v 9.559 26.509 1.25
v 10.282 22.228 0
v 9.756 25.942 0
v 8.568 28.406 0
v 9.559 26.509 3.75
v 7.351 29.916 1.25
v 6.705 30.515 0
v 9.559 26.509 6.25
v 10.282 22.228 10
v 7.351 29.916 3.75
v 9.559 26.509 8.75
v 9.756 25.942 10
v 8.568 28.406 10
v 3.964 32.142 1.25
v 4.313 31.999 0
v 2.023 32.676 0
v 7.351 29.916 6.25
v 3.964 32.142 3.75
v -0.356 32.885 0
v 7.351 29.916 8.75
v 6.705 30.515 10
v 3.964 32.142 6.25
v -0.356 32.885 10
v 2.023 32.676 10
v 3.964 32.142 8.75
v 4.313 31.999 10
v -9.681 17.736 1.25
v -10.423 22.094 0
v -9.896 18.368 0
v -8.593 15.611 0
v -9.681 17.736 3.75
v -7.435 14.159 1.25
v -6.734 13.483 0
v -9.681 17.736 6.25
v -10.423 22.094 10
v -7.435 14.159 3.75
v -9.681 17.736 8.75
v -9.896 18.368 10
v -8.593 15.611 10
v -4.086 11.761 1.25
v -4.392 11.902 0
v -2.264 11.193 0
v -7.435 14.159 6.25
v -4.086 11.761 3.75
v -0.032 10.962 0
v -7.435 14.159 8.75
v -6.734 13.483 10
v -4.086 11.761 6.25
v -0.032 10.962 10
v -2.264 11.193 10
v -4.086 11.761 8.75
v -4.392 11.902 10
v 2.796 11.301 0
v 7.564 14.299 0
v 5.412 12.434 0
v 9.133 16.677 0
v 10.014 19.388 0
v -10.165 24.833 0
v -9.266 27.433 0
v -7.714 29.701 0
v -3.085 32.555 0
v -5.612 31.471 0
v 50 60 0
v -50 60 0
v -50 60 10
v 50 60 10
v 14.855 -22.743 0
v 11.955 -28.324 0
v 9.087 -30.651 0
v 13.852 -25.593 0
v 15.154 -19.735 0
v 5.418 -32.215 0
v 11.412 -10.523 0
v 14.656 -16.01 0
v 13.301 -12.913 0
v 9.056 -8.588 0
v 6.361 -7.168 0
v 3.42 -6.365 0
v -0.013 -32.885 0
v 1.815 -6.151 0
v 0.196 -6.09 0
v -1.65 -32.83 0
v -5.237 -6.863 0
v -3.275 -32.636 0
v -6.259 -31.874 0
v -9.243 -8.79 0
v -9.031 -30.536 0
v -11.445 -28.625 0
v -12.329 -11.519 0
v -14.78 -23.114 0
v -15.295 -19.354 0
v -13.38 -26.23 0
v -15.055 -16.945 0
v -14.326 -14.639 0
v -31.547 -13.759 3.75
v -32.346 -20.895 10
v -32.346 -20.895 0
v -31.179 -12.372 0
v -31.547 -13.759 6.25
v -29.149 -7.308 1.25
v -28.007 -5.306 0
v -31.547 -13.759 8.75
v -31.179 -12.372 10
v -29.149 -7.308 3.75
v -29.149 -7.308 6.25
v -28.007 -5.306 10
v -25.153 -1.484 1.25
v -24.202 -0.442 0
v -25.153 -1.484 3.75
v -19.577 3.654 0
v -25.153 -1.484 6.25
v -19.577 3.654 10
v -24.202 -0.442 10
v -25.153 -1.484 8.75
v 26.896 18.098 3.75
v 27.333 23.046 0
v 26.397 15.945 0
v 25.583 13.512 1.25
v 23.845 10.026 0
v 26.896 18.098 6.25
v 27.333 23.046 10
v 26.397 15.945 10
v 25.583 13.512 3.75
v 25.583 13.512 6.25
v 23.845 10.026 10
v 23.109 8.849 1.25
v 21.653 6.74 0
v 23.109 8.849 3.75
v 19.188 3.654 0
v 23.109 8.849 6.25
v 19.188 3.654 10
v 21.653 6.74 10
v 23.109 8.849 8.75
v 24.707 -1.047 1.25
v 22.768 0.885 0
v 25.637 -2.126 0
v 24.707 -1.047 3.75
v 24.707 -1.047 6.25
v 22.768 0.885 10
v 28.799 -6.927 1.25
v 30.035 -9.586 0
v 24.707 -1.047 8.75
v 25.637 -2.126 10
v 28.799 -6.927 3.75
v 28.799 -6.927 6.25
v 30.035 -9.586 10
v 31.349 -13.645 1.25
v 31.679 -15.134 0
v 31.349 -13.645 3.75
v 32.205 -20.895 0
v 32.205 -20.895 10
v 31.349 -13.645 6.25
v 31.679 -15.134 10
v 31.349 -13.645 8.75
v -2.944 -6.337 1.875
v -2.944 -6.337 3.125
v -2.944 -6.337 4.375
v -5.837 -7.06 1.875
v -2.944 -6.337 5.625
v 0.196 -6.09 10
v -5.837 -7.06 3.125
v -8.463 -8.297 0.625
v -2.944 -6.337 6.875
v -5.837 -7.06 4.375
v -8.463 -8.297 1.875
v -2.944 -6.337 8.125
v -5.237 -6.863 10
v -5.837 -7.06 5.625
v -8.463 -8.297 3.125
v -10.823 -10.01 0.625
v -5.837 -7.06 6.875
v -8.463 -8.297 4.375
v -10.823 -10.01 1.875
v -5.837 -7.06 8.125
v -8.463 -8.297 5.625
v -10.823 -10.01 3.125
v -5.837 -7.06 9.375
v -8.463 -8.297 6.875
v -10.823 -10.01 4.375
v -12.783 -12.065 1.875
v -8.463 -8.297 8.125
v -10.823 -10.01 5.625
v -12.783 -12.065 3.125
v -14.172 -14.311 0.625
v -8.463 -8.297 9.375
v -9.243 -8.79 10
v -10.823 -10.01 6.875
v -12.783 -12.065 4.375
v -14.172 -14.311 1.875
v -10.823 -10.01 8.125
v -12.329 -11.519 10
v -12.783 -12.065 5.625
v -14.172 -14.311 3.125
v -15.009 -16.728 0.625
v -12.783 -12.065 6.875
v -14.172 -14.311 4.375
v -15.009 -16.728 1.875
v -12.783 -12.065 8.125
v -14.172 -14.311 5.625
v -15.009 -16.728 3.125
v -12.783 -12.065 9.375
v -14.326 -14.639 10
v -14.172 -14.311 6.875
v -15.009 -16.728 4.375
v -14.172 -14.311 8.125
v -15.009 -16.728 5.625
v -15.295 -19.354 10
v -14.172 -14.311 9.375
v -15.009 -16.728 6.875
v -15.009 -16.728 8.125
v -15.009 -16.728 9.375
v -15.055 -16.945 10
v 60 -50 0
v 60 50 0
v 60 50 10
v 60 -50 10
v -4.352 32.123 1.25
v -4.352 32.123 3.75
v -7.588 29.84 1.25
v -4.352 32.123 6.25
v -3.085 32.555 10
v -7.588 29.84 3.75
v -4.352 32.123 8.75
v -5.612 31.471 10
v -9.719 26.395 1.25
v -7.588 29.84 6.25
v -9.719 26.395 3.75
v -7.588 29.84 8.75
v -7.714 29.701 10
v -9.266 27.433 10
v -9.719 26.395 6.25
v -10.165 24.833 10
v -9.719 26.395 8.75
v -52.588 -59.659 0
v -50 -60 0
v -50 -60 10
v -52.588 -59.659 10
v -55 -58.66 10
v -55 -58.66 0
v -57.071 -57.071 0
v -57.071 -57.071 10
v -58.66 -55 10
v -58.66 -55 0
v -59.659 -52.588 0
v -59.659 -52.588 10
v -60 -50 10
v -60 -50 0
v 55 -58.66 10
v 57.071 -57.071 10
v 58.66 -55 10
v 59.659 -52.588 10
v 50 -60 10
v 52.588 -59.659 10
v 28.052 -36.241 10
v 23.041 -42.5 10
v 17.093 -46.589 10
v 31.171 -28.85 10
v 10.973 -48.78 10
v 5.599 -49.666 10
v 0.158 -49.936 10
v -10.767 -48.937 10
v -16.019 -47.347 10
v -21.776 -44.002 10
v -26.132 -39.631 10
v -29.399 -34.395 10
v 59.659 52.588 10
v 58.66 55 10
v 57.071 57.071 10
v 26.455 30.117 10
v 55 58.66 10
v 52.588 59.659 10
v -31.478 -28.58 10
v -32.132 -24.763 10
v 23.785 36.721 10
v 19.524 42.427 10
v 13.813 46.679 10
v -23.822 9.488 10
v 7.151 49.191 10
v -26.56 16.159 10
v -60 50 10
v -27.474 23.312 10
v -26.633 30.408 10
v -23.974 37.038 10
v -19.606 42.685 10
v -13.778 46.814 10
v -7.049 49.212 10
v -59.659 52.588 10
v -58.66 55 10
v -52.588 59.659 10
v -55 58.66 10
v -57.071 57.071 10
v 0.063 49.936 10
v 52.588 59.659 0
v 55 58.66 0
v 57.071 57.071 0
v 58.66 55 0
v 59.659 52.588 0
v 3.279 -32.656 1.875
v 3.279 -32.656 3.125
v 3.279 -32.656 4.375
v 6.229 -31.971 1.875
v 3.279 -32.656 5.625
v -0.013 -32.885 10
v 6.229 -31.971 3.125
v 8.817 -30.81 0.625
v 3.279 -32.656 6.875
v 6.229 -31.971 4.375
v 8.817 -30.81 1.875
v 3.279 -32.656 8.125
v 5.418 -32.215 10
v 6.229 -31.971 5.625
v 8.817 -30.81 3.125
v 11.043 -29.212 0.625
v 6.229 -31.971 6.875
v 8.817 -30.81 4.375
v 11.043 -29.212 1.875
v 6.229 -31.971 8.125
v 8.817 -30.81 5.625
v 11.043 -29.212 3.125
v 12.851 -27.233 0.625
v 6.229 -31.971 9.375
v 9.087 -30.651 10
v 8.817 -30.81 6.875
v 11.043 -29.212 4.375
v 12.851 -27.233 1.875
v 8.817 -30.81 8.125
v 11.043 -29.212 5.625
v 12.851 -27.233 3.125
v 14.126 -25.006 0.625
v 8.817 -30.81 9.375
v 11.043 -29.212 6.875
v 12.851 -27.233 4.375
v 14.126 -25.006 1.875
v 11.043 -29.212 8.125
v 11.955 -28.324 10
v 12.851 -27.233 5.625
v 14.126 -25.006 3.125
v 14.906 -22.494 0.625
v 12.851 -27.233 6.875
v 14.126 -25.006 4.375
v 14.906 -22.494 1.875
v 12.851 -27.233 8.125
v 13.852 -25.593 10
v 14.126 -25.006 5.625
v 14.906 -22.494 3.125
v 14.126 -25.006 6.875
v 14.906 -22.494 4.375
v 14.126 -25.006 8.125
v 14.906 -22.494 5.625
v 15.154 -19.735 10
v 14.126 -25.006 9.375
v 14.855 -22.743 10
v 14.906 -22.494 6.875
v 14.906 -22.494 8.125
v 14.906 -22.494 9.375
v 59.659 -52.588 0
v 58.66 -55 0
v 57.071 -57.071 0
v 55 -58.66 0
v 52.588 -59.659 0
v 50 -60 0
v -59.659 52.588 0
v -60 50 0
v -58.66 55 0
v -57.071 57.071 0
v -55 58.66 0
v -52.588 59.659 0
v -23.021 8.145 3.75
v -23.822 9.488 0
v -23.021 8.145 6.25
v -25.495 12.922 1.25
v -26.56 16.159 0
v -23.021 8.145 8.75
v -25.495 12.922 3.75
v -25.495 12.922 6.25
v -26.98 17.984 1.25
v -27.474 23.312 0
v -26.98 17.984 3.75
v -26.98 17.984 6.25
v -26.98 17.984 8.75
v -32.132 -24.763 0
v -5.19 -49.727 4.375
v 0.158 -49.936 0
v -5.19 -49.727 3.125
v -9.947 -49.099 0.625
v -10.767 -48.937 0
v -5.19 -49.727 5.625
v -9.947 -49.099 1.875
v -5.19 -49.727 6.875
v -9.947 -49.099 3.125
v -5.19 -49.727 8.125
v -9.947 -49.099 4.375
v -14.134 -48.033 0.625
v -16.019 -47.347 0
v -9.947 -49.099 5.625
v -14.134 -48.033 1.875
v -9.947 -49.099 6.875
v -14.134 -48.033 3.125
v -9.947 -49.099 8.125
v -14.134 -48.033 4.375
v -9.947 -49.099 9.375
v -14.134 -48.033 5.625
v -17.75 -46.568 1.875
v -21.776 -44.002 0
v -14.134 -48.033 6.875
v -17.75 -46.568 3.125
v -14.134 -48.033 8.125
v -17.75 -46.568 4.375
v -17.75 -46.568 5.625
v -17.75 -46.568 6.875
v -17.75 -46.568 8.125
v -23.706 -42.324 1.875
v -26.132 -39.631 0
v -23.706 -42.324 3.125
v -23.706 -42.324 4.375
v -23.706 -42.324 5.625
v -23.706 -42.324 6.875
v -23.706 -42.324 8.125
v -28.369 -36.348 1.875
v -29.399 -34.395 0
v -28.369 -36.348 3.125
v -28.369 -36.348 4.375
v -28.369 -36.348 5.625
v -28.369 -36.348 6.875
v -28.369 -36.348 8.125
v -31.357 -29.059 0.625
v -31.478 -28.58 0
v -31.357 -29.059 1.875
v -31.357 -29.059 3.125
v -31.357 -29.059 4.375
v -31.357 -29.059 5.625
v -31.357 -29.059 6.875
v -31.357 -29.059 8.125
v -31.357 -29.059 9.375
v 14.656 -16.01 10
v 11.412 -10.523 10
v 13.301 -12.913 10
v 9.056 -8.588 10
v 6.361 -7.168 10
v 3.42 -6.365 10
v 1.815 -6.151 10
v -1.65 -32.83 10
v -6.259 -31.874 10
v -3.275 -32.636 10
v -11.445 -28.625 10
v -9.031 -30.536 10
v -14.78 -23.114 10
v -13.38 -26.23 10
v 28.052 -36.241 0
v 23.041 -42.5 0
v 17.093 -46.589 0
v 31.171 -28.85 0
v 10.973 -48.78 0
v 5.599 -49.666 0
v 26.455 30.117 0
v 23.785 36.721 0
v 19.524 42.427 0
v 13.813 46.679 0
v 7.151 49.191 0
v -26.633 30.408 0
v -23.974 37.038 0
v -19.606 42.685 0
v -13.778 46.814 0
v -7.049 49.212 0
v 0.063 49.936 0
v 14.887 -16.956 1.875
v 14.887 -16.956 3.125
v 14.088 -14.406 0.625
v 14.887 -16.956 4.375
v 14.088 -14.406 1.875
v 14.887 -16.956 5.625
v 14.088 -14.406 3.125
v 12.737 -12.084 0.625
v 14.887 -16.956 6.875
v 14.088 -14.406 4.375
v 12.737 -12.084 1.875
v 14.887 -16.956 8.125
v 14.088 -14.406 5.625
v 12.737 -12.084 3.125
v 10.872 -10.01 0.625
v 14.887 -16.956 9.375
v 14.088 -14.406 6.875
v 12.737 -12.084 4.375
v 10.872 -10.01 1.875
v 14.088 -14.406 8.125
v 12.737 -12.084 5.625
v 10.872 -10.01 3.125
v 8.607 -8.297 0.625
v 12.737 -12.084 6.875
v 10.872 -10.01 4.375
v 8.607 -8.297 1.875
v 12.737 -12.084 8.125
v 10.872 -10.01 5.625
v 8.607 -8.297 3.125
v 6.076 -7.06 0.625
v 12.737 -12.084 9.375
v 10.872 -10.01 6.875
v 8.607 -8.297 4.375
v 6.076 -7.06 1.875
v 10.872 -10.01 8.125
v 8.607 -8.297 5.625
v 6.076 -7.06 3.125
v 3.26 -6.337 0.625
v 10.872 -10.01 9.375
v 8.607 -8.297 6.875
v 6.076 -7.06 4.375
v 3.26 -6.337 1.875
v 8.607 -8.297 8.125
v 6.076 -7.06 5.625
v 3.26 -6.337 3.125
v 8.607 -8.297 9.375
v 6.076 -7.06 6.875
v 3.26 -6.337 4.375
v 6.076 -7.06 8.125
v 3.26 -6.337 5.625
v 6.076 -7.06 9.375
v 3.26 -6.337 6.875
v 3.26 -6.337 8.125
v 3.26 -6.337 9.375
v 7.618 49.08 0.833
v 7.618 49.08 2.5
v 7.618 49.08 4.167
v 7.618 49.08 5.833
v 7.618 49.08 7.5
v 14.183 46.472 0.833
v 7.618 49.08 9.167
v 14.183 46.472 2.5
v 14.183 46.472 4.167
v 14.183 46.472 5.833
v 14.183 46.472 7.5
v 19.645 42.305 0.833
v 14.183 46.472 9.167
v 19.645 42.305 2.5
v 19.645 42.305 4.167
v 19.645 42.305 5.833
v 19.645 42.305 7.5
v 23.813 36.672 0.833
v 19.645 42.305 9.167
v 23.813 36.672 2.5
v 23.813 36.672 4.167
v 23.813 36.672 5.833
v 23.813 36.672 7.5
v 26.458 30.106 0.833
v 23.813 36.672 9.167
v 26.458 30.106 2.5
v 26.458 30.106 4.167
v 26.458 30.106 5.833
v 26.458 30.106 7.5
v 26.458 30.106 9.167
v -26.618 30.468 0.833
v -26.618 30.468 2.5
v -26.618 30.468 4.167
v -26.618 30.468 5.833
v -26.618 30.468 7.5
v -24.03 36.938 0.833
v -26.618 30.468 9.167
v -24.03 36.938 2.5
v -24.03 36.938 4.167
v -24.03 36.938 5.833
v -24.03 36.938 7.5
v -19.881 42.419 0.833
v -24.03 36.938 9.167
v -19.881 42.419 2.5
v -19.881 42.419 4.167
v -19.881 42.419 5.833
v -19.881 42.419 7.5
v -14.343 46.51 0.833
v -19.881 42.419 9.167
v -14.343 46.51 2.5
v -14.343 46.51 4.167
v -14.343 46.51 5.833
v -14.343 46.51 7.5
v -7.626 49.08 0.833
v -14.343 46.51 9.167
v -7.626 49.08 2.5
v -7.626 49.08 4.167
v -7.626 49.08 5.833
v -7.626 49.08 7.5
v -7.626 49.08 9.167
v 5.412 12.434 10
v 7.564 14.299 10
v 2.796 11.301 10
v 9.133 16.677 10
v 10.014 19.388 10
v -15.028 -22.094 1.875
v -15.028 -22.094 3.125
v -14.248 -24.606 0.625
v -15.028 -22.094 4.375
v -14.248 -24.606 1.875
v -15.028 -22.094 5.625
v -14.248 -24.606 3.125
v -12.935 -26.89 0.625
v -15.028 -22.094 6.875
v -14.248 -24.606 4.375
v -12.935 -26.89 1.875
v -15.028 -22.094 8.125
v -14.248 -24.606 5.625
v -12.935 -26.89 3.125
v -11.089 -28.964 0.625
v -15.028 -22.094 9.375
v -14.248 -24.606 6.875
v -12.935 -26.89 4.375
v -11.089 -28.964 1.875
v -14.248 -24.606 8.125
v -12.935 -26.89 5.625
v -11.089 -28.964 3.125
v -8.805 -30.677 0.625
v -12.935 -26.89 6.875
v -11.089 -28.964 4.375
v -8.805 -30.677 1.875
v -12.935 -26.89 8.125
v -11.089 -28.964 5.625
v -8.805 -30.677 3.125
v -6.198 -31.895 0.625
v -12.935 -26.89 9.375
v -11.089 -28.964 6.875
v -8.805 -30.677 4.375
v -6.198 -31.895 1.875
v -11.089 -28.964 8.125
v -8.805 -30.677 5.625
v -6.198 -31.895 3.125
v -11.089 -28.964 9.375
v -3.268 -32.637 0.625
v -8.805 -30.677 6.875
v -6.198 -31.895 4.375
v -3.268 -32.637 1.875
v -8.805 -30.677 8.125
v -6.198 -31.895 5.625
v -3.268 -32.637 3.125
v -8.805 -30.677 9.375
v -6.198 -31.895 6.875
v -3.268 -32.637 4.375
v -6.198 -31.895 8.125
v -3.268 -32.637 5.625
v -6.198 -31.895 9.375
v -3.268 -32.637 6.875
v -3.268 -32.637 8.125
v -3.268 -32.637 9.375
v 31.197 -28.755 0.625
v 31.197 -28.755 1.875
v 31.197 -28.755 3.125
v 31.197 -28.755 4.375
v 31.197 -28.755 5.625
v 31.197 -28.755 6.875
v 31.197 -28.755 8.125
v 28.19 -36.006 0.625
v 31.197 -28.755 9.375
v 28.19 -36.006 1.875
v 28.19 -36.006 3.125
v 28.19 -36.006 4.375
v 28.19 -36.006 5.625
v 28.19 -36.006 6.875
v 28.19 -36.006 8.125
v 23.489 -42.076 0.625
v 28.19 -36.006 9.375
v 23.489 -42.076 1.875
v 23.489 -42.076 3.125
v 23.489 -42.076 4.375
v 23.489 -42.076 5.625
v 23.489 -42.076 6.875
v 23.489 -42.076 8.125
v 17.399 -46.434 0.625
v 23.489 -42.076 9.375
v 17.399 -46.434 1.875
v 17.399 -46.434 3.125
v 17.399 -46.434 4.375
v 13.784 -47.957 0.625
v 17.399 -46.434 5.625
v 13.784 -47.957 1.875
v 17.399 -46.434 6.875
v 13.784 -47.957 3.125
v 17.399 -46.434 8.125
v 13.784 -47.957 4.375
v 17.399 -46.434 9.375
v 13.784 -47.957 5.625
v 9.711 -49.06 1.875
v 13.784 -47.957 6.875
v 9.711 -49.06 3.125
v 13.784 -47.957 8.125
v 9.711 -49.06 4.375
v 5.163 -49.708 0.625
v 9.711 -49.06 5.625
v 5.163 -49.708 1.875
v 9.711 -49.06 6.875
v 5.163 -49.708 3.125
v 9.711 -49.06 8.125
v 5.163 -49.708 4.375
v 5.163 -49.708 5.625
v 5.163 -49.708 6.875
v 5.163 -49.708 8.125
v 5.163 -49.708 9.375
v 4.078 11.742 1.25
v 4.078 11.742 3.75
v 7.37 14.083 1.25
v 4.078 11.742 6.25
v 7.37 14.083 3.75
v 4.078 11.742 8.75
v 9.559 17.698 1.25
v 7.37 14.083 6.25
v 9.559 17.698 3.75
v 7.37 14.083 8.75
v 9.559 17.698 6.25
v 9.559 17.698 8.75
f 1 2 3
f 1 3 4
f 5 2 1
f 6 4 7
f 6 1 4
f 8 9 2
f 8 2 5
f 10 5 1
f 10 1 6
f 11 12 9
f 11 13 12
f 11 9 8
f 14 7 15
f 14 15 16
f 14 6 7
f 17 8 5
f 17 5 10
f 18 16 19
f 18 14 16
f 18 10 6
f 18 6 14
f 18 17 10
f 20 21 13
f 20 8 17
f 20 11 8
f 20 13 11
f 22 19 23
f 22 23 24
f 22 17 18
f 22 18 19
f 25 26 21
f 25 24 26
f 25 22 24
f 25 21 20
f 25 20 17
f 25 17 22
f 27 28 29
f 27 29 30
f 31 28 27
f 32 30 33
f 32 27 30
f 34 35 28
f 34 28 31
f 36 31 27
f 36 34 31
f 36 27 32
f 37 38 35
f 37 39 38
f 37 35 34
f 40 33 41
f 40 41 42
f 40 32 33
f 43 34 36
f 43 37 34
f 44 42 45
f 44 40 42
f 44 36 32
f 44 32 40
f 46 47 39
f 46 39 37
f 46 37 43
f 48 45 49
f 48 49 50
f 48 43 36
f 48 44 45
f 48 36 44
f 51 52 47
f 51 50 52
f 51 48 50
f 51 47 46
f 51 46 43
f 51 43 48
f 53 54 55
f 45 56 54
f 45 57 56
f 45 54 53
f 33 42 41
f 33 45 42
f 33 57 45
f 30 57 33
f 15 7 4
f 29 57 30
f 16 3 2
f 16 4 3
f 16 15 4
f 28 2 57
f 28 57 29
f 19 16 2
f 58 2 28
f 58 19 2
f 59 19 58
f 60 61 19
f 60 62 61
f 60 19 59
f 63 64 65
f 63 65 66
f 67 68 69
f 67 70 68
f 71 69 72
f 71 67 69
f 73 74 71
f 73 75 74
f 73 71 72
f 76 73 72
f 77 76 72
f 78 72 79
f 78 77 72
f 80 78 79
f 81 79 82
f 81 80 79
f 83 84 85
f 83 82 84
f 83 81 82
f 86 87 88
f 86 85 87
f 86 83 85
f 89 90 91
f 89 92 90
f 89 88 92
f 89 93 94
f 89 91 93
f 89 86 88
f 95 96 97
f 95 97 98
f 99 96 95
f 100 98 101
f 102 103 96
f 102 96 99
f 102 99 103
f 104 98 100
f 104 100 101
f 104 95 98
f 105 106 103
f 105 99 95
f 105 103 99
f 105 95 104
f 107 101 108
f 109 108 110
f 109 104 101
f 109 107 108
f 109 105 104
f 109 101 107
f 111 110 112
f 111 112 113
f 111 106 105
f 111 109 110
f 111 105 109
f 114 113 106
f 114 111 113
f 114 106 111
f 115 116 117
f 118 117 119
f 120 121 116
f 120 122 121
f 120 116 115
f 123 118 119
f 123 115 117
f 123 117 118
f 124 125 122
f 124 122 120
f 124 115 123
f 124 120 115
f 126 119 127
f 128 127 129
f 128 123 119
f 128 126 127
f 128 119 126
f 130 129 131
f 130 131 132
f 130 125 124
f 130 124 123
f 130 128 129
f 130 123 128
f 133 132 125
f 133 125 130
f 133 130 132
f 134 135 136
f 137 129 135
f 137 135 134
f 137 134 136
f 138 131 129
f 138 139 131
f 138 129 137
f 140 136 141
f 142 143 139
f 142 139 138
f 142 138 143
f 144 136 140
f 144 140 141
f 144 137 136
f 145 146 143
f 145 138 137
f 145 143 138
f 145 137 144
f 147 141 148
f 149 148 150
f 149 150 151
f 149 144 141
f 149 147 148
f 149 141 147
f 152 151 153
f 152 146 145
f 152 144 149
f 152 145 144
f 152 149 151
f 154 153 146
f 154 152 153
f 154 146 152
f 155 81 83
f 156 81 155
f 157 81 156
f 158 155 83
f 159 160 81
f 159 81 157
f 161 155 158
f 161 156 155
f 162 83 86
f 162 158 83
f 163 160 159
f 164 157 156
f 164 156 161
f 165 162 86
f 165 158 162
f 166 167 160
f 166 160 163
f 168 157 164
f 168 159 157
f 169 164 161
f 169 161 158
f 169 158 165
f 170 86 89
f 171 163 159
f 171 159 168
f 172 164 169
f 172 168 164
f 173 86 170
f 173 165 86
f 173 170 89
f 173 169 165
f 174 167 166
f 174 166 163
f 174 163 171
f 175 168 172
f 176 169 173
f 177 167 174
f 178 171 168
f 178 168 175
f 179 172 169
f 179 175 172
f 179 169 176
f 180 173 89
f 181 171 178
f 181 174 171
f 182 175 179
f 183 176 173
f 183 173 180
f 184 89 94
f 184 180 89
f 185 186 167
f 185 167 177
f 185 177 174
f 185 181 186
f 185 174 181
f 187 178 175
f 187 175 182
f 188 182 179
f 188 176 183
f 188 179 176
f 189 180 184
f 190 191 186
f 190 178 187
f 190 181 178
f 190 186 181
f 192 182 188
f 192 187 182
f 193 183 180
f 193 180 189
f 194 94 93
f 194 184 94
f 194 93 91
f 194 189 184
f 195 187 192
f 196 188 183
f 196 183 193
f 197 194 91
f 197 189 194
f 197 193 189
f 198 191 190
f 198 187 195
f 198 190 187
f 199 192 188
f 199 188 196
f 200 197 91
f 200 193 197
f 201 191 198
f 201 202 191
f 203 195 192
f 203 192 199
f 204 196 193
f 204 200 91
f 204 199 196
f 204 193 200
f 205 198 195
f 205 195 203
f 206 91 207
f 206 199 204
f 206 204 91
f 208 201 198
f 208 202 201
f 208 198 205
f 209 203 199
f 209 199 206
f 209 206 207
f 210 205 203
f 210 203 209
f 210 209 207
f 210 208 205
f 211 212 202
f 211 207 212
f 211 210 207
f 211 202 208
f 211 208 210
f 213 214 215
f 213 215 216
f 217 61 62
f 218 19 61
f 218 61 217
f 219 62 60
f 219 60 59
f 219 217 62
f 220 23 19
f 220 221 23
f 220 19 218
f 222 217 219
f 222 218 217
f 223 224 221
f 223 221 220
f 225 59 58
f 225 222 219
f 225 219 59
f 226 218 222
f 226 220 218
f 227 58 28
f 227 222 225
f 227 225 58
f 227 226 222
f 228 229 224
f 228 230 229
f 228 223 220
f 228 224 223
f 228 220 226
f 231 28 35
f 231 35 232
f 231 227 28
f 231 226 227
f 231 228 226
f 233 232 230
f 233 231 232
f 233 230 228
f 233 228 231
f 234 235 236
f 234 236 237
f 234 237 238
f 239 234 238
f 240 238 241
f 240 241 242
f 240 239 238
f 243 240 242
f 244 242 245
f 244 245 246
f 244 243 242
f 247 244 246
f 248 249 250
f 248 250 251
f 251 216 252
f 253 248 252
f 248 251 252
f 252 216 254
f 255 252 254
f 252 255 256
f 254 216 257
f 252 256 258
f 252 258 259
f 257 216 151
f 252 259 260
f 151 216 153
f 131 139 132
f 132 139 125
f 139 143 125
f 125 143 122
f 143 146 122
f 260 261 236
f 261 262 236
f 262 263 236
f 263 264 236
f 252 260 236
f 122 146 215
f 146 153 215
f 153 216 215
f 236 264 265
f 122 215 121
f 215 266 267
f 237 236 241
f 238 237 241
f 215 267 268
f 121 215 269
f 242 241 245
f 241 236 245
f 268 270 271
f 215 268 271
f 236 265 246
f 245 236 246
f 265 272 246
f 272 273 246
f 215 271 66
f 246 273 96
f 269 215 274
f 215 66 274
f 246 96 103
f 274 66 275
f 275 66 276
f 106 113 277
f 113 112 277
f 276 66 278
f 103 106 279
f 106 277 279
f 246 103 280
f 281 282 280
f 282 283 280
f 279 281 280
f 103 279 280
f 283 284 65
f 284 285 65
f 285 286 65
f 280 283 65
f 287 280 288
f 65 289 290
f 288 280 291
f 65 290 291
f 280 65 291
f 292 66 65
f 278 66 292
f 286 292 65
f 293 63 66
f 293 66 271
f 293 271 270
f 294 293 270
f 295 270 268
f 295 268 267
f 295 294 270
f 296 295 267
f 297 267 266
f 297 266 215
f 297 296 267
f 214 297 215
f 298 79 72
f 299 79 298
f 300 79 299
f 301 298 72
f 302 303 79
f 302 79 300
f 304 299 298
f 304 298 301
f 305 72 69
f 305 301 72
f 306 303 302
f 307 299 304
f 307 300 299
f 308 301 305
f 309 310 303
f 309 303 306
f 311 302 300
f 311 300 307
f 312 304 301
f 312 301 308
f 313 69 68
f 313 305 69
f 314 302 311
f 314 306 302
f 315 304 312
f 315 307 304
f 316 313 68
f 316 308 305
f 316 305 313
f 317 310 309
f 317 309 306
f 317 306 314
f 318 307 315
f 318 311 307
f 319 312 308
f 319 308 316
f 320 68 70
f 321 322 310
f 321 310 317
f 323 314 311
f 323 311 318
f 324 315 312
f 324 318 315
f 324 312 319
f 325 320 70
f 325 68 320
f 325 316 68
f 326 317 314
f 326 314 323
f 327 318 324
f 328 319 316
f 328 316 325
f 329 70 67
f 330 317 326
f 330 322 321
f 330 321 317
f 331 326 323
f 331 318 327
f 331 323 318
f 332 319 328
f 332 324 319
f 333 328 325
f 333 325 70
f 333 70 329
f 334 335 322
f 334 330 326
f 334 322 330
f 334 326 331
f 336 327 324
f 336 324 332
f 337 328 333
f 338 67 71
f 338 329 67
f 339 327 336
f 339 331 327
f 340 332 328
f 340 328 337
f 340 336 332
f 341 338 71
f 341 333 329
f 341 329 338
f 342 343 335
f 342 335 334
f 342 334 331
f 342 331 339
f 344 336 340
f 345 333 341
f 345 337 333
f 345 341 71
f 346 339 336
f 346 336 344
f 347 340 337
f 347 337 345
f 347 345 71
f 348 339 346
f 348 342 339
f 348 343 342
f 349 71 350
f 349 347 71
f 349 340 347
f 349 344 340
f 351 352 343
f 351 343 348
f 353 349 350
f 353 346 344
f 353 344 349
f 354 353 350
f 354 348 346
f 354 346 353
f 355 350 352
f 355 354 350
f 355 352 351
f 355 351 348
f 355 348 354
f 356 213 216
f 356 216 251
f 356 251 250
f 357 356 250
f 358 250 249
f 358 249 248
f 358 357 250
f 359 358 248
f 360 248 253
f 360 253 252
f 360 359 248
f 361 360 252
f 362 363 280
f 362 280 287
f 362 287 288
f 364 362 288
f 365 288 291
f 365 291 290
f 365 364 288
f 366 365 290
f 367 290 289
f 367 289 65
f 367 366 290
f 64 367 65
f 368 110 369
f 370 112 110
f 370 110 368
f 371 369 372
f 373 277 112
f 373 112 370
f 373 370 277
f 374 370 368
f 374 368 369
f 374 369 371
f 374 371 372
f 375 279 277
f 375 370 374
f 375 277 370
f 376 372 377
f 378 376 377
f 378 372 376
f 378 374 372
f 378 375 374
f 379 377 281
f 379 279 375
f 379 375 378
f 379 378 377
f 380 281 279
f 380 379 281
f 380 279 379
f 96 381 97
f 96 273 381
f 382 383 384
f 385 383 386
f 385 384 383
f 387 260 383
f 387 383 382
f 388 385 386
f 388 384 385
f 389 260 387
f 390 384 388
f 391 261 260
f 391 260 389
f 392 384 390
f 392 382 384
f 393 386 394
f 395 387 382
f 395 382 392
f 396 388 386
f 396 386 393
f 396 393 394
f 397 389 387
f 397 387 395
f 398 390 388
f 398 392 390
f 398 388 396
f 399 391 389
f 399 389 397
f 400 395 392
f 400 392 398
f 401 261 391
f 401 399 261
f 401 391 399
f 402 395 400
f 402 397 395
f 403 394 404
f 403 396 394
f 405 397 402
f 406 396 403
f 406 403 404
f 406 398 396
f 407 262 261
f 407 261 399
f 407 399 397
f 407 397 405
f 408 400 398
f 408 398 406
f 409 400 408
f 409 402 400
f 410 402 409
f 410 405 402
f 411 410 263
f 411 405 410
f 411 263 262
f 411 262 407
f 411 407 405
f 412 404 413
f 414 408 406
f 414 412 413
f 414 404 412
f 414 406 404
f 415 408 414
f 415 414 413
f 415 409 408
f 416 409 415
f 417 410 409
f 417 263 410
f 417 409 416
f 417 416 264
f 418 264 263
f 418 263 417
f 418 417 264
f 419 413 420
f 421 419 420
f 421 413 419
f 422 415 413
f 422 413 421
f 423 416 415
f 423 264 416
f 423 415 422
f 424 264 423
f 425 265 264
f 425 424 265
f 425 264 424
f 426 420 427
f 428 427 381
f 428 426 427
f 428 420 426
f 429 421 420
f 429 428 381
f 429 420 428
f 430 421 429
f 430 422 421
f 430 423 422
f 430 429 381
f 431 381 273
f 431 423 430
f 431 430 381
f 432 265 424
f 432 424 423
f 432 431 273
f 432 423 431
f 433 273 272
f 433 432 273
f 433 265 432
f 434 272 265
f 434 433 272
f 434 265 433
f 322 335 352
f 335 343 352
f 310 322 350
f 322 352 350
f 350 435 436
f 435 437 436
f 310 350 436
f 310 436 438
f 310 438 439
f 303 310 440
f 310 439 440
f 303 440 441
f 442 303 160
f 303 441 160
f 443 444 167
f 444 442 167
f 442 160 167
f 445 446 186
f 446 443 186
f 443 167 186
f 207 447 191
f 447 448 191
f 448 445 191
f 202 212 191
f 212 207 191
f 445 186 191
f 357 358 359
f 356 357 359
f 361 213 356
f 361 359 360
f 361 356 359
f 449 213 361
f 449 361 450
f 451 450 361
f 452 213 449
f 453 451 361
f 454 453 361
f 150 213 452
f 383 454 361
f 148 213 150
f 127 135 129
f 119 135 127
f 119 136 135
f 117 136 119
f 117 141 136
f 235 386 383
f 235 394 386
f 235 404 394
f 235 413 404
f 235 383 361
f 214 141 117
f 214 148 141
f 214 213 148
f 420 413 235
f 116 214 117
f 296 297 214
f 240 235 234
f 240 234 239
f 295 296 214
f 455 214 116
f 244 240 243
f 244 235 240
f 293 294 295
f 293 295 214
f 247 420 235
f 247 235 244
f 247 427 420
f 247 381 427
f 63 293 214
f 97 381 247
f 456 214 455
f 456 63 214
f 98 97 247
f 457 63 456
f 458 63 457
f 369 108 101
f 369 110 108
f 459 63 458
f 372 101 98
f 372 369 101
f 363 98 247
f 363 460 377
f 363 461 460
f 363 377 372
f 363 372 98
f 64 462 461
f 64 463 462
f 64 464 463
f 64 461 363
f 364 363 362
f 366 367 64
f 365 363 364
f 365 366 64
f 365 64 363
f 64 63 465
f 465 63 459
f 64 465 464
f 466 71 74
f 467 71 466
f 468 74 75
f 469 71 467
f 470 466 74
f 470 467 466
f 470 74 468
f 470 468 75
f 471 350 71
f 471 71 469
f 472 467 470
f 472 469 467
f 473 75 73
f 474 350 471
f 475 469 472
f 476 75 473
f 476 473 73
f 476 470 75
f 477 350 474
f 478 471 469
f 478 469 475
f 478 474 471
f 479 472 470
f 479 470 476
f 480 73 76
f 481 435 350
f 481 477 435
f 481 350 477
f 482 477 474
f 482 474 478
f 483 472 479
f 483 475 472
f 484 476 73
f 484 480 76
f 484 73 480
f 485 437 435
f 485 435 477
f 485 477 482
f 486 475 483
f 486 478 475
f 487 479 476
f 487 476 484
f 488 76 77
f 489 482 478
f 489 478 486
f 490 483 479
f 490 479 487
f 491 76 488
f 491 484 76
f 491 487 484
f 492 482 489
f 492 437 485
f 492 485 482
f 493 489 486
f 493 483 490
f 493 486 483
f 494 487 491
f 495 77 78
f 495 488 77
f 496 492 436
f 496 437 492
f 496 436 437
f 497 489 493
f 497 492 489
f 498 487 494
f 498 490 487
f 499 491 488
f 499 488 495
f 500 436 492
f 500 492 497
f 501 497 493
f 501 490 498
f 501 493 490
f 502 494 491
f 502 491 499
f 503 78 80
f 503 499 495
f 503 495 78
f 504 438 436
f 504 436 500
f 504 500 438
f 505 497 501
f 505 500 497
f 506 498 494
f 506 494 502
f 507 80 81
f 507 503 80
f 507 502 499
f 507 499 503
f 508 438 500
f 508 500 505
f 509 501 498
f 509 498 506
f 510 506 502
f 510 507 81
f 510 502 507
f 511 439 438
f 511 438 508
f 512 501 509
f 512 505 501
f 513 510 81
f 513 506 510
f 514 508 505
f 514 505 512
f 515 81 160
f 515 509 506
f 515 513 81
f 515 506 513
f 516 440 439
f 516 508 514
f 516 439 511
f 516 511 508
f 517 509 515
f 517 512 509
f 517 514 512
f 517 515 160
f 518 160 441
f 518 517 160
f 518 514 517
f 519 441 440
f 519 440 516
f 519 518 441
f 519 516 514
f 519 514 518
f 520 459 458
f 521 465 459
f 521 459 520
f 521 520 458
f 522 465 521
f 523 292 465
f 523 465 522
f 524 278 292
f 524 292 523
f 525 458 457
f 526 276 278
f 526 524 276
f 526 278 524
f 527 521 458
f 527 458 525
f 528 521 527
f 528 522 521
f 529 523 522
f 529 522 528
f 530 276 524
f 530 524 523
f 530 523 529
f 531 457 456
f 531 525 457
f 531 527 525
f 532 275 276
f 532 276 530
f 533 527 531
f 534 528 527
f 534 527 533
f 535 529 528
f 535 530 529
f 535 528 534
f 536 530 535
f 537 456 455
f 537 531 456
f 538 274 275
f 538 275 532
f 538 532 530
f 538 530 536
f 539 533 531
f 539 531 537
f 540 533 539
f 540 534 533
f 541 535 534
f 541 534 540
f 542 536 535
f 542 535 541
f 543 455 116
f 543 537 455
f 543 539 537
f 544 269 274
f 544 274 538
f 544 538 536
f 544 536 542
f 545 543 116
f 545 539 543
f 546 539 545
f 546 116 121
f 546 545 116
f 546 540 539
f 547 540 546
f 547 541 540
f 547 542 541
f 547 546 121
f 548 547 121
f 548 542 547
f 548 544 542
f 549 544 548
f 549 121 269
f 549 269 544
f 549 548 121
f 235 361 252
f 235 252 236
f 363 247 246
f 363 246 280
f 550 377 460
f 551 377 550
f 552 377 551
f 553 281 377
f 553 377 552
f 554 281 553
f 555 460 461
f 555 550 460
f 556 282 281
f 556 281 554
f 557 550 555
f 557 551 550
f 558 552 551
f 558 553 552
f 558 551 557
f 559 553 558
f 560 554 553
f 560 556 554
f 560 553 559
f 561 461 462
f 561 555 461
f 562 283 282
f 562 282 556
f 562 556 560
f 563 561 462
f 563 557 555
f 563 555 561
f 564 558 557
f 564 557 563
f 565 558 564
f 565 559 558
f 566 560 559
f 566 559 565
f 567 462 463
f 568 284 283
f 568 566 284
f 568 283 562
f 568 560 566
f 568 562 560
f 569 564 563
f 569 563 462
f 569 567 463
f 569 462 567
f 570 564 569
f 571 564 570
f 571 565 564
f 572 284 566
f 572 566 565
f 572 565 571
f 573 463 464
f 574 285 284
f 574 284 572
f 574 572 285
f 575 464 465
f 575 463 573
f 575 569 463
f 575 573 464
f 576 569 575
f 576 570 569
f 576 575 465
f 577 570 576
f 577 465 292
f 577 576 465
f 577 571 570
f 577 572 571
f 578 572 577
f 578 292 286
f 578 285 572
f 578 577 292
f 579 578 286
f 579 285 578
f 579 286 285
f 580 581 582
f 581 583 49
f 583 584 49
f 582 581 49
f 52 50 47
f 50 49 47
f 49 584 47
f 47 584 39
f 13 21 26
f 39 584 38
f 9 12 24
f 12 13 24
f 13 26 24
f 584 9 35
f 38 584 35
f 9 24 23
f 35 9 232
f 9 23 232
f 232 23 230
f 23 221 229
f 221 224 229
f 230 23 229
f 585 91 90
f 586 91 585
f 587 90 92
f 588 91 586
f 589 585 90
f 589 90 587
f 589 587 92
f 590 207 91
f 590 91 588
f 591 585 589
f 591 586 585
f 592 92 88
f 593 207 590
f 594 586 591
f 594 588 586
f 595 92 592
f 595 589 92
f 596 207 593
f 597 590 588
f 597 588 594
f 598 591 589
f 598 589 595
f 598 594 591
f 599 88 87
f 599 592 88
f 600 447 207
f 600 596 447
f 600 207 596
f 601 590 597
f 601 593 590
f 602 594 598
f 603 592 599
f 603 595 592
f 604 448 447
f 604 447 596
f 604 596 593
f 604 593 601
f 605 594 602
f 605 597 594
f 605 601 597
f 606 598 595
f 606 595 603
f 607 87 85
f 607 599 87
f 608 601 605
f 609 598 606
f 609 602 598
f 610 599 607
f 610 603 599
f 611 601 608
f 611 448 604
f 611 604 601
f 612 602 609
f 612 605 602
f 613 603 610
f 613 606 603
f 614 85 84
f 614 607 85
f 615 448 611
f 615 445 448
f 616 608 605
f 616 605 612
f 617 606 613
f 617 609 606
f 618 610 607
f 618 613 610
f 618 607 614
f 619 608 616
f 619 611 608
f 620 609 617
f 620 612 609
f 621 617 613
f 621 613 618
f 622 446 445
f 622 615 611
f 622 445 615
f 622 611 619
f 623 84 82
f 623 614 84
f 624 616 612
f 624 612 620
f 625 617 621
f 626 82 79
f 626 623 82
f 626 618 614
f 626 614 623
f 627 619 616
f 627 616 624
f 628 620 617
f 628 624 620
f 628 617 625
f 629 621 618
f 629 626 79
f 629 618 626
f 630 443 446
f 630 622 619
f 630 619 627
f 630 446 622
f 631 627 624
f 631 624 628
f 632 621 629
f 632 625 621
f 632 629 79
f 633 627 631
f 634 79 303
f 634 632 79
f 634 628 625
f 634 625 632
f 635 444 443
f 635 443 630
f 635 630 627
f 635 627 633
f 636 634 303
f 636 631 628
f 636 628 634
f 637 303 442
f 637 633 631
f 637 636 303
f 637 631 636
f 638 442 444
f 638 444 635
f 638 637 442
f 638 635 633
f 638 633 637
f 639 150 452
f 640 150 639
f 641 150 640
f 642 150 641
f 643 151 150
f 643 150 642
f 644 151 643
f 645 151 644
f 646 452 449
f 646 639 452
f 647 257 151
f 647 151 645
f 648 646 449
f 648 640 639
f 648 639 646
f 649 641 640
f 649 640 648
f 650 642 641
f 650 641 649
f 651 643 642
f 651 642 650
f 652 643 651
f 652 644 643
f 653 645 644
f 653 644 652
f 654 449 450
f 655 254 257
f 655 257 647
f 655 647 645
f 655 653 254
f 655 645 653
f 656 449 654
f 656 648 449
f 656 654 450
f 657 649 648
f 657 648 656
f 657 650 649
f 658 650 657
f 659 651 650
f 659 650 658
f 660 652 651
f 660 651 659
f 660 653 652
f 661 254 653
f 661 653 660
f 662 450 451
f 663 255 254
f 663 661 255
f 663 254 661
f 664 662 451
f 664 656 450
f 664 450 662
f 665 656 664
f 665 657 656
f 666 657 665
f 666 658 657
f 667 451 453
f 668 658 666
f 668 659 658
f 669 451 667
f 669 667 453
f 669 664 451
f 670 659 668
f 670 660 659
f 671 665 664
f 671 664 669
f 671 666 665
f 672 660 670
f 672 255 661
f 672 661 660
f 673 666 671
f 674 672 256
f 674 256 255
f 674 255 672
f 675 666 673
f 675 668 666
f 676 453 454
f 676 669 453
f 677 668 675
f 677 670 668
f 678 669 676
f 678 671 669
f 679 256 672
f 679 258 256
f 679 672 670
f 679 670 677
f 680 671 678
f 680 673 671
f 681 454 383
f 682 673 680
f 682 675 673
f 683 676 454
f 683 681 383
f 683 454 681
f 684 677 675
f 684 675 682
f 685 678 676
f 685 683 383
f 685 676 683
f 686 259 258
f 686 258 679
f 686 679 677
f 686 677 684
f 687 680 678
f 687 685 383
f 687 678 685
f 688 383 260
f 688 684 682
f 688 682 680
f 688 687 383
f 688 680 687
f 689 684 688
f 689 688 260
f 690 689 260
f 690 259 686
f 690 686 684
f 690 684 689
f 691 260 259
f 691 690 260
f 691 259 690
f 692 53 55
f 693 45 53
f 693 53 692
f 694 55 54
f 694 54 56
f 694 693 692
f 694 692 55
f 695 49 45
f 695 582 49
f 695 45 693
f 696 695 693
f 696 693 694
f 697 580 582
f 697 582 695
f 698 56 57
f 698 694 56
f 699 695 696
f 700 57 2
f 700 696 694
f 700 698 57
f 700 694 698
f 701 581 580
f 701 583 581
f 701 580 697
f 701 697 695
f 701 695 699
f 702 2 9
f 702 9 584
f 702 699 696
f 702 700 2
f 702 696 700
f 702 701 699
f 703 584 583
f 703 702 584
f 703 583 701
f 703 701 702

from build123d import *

# Parameters (mm, degrees)
BOSS_EXTRUDE1_DEPTH = 10
CUT_EXTRUDE7_DEPTH  = 10


with BuildPart() as part:
    # Sketch1 → Boss-Extrude1 (new body)
    with BuildSketch(Plane.XY):
        with BuildLine():
            Line((-50, 60), (50, 60))
            ThreePointArc((50, 60), (57.071067812, 57.071067812), (60, 50))
            Line((60, 50), (60, -50))
            ThreePointArc((60, -50), (57.071067812, -57.071067812), (50, -60))
            Line((50, -60), (-50, -60))
            ThreePointArc((-50, -60), (-57.071067812, -57.071067812), (-60, -50))
            Line((-60, -50), (-60, 50))
            ThreePointArc((-60, 50), (-57.071067812, 57.071067812), (-50, 60))
        make_face()
    extrude(amount=BOSS_EXTRUDE1_DEPTH)

    # Sketch2 → Cut-Extrude7 (cut)
    with BuildSketch(Plane.XY.offset(10)):
        with BuildLine():
            add(Edge.make_bspline(
                [(19.188301282, 3.653846154), (20.184495938, 2.942038158), (22.156373381, 1.53307845), (24.760502173, -0.991125553), (27.003564951, -3.806904393), (28.862007101, -6.896986644), (30.350934887, -10.185417286), (31.416781282, -13.637046931), (32.093794674, -17.221431342), (32.167744744, -19.661780222), (32.205128205, -20.895432692)],
                knots=[0, 0, 0, 0, 1.013736912, 2.006600758, 2.994453809, 3.989973287, 4.987781207, 5.978959008, 6.978317308, 8, 8, 8, 8], degree=3))
            add(Edge.make_bspline(
                [(32.205128205, -20.895432692), (32.160027904, -22.231261178), (32.070577244, -24.880705531), (31.279713876, -28.766115268), (30.010014477, -32.498873463), (28.274722464, -36.037779916), (26.098985434, -39.272858958), (23.56296157, -42.136825847), (20.663454018, -44.554883143), (17.963930355, -46.195519421), (15.640356037, -47.285363085), (13.765251942, -47.98284115), (11.785265286, -48.596872991), (9.686267137, -49.087443687), (7.468639207, -49.47041463), (5.135546282, -49.723327923), (2.685452566, -49.907180476), (1.014592239, -49.926163712), (0.157852564, -49.935897436)],
                knots=[0, 0, 0, 0, 1.313679292, 2.605514271, 3.884962679, 5.186178731, 6.472827995, 7.711026938, 8.938935107, 10.174644318, 10.808706728, 11.462743532, 12.142127587, 12.847854939, 13.582806024, 14.355735269, 15.156897313, 16, 16, 16, 16], degree=3))
            add(Edge.make_bspline(
                [(0.157852564, -49.935897436), (-0.75577531, -49.923504468), (-2.539910399, -49.899303445), (-5.144350214, -49.752971256), (-7.601106371, -49.483191446), (-9.915332327, -49.128047212), (-12.084801555, -48.658088465), (-14.109578312, -48.062206506), (-15.994551648, -47.383728602), (-18.301858023, -46.350687769), (-20.938690793, -44.737373284), (-23.788630171, -42.374720743), (-26.290147794, -39.560727744), (-28.464980457, -36.374382651), (-30.179265543, -32.835287864), (-31.454059018, -29.054524044), (-32.209006815, -25.042336581), (-32.299894084, -22.294185431), (-32.346153846, -20.895432692)],
                knots=[0, 0, 0, 0, 0.886964665, 1.7320671, 2.531131818, 3.285397207, 4.004107883, 4.684213108, 5.332925796, 5.947568694, 7.135706876, 8.320776993, 9.52873045, 10.778999824, 12.05415135, 13.333578234, 14.642845846, 16, 16, 16, 16], degree=3))
            add(Edge.make_bspline(
                [(-32.346153846, -20.895432692), (-32.303880176, -19.675251034), (-32.220807296, -17.277446336), (-31.625745014, -13.763904108), (-30.605394029, -10.432650346), (-29.205313672, -7.260494213), (-27.399933808, -4.247082748), (-25.178578493, -1.414588745), (-22.569412256, 1.262540859), (-20.590832741, 2.843522672), (-19.576722756, 3.653846154)],
                knots=[0, 0, 0, 0, 1.01821053, 2.000906977, 2.963938143, 3.919209931, 4.888045165, 5.887808425, 6.917407893, 8, 8, 8, 8], degree=3))
            add(Edge.make_bspline(
                [(-19.576722756, 3.653846154), (-20.205417157, 4.378953164), (-21.44312709, 5.80647049), (-23.044735918, 8.103945857), (-24.394023915, 10.472645366), (-25.539633666, 12.893345782), (-26.3864976, 15.40772552), (-27.02692196, 17.97625338), (-27.389145357, 20.62509678), (-27.445761968, 22.410495947), (-27.474358974, 23.312299679)],
                knots=[0, 0, 0, 0, 1.061529281, 2.089831458, 3.092927091, 4.075998741, 5.048384512, 6.024008542, 7.00192825, 8, 8, 8, 8], degree=3))
            add(Edge.make_bspline(
                [(-27.474358974, 23.312299679), (-27.436443694, 24.533076074), (-27.361638307, 26.94162088), (-26.699091348, 30.463482054), (-25.599102515, 33.809952101), (-24.102661321, 36.971233071), (-22.202413573, 39.878428225), (-19.944507855, 42.485532392), (-17.297202452, 44.697048355), (-14.358943535, 46.594626663), (-11.11500316, 48.10394285), (-7.596159511, 49.160049282), (-3.844903138, 49.828620337), (-1.259649221, 49.899594412), (0.062700321, 49.935897436)],
                knots=[0, 0, 0, 0, 1.022455555, 2.017265428, 2.990720743, 3.968117071, 4.939886797, 5.893155559, 6.847550415, 7.820889576, 8.817530429, 9.83499769, 10.892607882, 12, 12, 12, 12], degree=3))
            add(Edge.make_bspline(
                [(0.062700321, 49.935897436), (1.366004574, 49.899534999), (3.907174979, 49.82863586), (7.592508041, 49.16449477), (11.035308794, 48.08486337), (14.207107804, 46.54367878), (17.114979409, 44.642443103), (19.717291845, 42.353924223), (21.96811219, 39.681885896), (23.884133204, 36.699482457), (25.410907526, 33.48637487), (26.539646383, 30.116764519), (27.192522271, 26.617136868), (27.286208621, 24.241054818), (27.333333333, 23.045873397)],
                knots=[0, 0, 0, 0, 1.094655142, 2.134348324, 3.136019022, 4.118575226, 5.088726318, 6.048298823, 7.020513804, 8.015920439, 9.020015034, 10.003048569, 10.995523219, 12, 12, 12, 12], degree=3))
            add(Edge.make_bspline(
                [(27.333333333, 23.045873397), (27.310632226, 22.201183803), (27.266083001, 20.543543624), (26.936695016, 18.101371831), (26.382046073, 15.758104709), (25.608739865, 13.457115137), (24.533580254, 11.135872394), (23.07863932, 8.749897255), (21.308894722, 6.200051998), (19.91902587, 4.531230372), (19.188301282, 3.653846154)],
                knots=[0, 0, 0, 0, 0.940746401, 1.846144481, 2.739104268, 3.619506754, 4.545839139, 5.581956076, 6.728711598, 8, 8, 8, 8], degree=3))
        make_face()
        with BuildLine():
            add(Edge.make_bspline(
                [(-0.355969551, 32.884615385), (-1.058006441, 32.850770709), (-2.423623299, 32.784935337), (-4.372198645, 32.190698207), (-6.124031459, 31.218781122), (-7.639132699, 29.881231936), (-8.881594696, 28.258316376), (-9.794735999, 26.3924433), (-10.336239585, 24.306639671), (-10.39356827, 22.846120439), (-10.423076923, 22.094350962)],
                knots=[0, 0, 0, 0, 1.018099191, 1.980427864, 2.929421084, 3.909248076, 4.895556904, 5.880788387, 6.909183412, 8, 8, 8, 8], degree=3))
            add(Edge.make_bspline(
                [(-10.423076923, 22.094350962), (-10.386624716, 21.33616122), (-10.315448269, 19.855722672), (-9.755725432, 17.729843978), (-8.801662396, 15.803193319), (-7.491740304, 14.116012106), (-5.899972828, 12.737971286), (-4.117681218, 11.685500408), (-2.12509953, 11.084672073), (-0.740446478, 11.003197614), (-0.032451923, 10.961538462)],
                knots=[0, 0, 0, 0, 1.07118507, 2.091592095, 3.082435519, 4.092579768, 5.090825648, 6.043203473, 6.999459622, 8, 8, 8, 8], degree=3))
            add(Edge.make_bspline(
                [(-0.032451923, 10.961538462), (0.68892764, 10.993817162), (2.09431037, 11.056702125), (4.091867272, 11.673120279), (5.891410758, 12.658955484), (7.432453879, 14.052708358), (8.708910985, 15.740500597), (9.638525218, 17.700821167), (10.173577589, 19.896838181), (10.245008972, 21.43165248), (10.282051282, 22.227564103)],
                knots=[0, 0, 0, 0, 1.008803858, 1.965339183, 2.900766489, 3.864508618, 4.855158575, 5.849593072, 6.884859315, 8, 8, 8, 8], degree=3))
            add(Edge.make_bspline(
                [(10.282051282, 22.227564103), (10.244071952, 22.978836606), (10.170621263, 24.431771227), (9.64395171, 26.517710168), (8.676696729, 28.354461405), (7.405848472, 29.967299003), (5.812545346, 31.267952197), (3.962837117, 32.22446041), (1.870344264, 32.77924443), (0.402205391, 32.848731127), (-0.355969551, 32.884615385)],
                knots=[0, 0, 0, 0, 1.065910571, 2.061433587, 3.023559535, 3.990682701, 4.956464619, 5.918590567, 6.925120432, 8, 8, 8, 8], degree=3))
        make_face(mode=Mode.SUBTRACT)
        with BuildLine():
            add(Edge.make_bspline(
                [(0.195913462, -6.08974359), (-0.337581437, -6.098603068), (-1.389093206, -6.11606499), (-2.934901917, -6.317427104), (-4.418264236, -6.617506465), (-5.837339822, -7.031457481), (-7.184959587, -7.595776876), (-8.472546866, -8.276074338), (-9.695654923, -9.07922681), (-10.836141641, -9.990653065), (-11.866875136, -10.991030217), (-12.795987618, -12.034391147), (-13.555405894, -13.14770957), (-14.187820258, -14.29397844), (-14.695968788, -15.482281302), (-15.031893362, -16.732187052), (-15.248181767, -18.027050466), (-15.279216891, -18.909058919), (-15.294871795, -19.353966346)],
                knots=[0, 0, 0, 0, 1.129580664, 2.226389355, 3.296443603, 4.333934503, 5.352185725, 6.386189251, 7.41493955, 8.447544828, 9.47401038, 10.455044306, 11.4018853, 12.322125673, 13.225630306, 14.132028716, 15.057747923, 16, 16, 16, 16], degree=3))
            add(Edge.make_bspline(
                [(-15.294871795, -19.353966346), (-15.287410391, -19.817960864), (-15.272611619, -20.738236572), (-15.049096904, -22.081453305), (-14.727275196, -23.376893602), (-14.275266318, -24.612431357), (-13.670790334, -25.787347241), (-12.94903503, -26.913063976), (-12.084833098, -27.981687845), (-11.101617086, -28.987489278), (-10.000911129, -29.894901702), (-8.814591332, -30.694347869), (-7.558326263, -31.399180515), (-6.194403741, -31.906828917), (-4.773335261, -32.371473327), (-3.257049947, -32.653361907), (-1.662109023, -32.860783346), (-0.572402607, -32.876535224), (-0.013421474, -32.884615385)],
                knots=[0, 0, 0, 0, 0.973817353, 1.931446211, 2.852767904, 3.776304432, 4.688323523, 5.623710549, 6.581246645, 7.570897993, 8.57436511, 9.572506873, 10.574556662, 11.591826551, 12.624694332, 13.712108235, 14.826391851, 16, 16, 16, 16], degree=3))
            add(Edge.make_bspline(
                [(-0.013421474, -32.884615385), (0.551625294, -32.874373242), (1.652722495, -32.854414549), (3.262305187, -32.6780175), (4.784684748, -32.398126701), (6.218042765, -31.997817659), (7.567799531, -31.485005829), (8.815849199, -30.83229785), (9.990686817, -30.092598077), (11.054558867, -29.228407519), (12.02595247, -28.286620196), (12.862944436, -27.254501376), (13.574629427, -26.165240273), (14.148680931, -25.00706743), (14.611888942, -23.785449885), (14.929620567, -22.488206806), (15.126784469, -21.129916212), (15.144728747, -20.204682424), (15.153846154, -19.734575321)],
                knots=[0, 0, 0, 0, 1.200705402, 2.339794563, 3.437264955, 4.487414319, 5.499029866, 6.500076882, 7.476298407, 8.444948224, 9.407950986, 10.347155707, 11.263432813, 12.167927724, 13.089546445, 14.03463663, 15.00140776, 16, 16, 16, 16], degree=3))
            add(Edge.make_bspline(
                [(15.153846154, -19.734575321), (15.136437283, -19.258322238), (15.102408974, -18.327412501), (14.91621108, -16.952705339), (14.566922827, -15.649461454), (14.109951762, -14.387455358), (13.502075314, -13.192802145), (12.747409865, -12.068023142), (11.888415348, -10.985256241), (10.88444054, -9.992702282), (9.78675022, -9.085155172), (8.618433819, -8.276630316), (7.383089913, -7.591884327), (6.077339418, -7.032138508), (4.696411422, -6.617291072), (3.250842467, -6.317437648), (1.743003817, -6.116019921), (0.716739841, -6.09858949), (0.195913462, -6.08974359)],
                knots=[0, 0, 0, 0, 1.011708178, 1.977538892, 2.938094892, 3.871441737, 4.823268678, 5.775953079, 6.743660653, 7.753304209, 8.767430709, 9.76505158, 10.765940967, 11.761741361, 12.775867861, 13.822051386, 14.89469657, 16, 16, 16, 16], degree=3))
        make_face(mode=Mode.SUBTRACT)
    extrude(amount=-CUT_EXTRUDE7_DEPTH, mode=Mode.SUBTRACT)


with BuildPart() as cut_extrude7_piece_1:
    # of the separate pieces the step leaves, piece 1, a body of its own (cut_extrude7_pieces)
    add(part.part.solids().sort_by_distance((-50, 60, 0))[0])


with BuildPart() as cut_extrude7_piece_2:
    # of the separate pieces the step leaves, piece 2, a body of its own (cut_extrude7_pieces)
    add(part.part.solids().sort_by_distance((0.195913462, -6.08974359, 0))[0])


with BuildPart() as cut_extrude7_piece_3:
    # of the separate pieces the step leaves, piece 3, a body of its own (cut_extrude7_pieces)
    add(part.part.solids().sort_by_distance((-0.355969551, 32.884615385, 0))[0])


solid = Compound([cut_extrude7_piece_1.part, cut_extrude7_piece_2.part, cut_extrude7_piece_3.part])
